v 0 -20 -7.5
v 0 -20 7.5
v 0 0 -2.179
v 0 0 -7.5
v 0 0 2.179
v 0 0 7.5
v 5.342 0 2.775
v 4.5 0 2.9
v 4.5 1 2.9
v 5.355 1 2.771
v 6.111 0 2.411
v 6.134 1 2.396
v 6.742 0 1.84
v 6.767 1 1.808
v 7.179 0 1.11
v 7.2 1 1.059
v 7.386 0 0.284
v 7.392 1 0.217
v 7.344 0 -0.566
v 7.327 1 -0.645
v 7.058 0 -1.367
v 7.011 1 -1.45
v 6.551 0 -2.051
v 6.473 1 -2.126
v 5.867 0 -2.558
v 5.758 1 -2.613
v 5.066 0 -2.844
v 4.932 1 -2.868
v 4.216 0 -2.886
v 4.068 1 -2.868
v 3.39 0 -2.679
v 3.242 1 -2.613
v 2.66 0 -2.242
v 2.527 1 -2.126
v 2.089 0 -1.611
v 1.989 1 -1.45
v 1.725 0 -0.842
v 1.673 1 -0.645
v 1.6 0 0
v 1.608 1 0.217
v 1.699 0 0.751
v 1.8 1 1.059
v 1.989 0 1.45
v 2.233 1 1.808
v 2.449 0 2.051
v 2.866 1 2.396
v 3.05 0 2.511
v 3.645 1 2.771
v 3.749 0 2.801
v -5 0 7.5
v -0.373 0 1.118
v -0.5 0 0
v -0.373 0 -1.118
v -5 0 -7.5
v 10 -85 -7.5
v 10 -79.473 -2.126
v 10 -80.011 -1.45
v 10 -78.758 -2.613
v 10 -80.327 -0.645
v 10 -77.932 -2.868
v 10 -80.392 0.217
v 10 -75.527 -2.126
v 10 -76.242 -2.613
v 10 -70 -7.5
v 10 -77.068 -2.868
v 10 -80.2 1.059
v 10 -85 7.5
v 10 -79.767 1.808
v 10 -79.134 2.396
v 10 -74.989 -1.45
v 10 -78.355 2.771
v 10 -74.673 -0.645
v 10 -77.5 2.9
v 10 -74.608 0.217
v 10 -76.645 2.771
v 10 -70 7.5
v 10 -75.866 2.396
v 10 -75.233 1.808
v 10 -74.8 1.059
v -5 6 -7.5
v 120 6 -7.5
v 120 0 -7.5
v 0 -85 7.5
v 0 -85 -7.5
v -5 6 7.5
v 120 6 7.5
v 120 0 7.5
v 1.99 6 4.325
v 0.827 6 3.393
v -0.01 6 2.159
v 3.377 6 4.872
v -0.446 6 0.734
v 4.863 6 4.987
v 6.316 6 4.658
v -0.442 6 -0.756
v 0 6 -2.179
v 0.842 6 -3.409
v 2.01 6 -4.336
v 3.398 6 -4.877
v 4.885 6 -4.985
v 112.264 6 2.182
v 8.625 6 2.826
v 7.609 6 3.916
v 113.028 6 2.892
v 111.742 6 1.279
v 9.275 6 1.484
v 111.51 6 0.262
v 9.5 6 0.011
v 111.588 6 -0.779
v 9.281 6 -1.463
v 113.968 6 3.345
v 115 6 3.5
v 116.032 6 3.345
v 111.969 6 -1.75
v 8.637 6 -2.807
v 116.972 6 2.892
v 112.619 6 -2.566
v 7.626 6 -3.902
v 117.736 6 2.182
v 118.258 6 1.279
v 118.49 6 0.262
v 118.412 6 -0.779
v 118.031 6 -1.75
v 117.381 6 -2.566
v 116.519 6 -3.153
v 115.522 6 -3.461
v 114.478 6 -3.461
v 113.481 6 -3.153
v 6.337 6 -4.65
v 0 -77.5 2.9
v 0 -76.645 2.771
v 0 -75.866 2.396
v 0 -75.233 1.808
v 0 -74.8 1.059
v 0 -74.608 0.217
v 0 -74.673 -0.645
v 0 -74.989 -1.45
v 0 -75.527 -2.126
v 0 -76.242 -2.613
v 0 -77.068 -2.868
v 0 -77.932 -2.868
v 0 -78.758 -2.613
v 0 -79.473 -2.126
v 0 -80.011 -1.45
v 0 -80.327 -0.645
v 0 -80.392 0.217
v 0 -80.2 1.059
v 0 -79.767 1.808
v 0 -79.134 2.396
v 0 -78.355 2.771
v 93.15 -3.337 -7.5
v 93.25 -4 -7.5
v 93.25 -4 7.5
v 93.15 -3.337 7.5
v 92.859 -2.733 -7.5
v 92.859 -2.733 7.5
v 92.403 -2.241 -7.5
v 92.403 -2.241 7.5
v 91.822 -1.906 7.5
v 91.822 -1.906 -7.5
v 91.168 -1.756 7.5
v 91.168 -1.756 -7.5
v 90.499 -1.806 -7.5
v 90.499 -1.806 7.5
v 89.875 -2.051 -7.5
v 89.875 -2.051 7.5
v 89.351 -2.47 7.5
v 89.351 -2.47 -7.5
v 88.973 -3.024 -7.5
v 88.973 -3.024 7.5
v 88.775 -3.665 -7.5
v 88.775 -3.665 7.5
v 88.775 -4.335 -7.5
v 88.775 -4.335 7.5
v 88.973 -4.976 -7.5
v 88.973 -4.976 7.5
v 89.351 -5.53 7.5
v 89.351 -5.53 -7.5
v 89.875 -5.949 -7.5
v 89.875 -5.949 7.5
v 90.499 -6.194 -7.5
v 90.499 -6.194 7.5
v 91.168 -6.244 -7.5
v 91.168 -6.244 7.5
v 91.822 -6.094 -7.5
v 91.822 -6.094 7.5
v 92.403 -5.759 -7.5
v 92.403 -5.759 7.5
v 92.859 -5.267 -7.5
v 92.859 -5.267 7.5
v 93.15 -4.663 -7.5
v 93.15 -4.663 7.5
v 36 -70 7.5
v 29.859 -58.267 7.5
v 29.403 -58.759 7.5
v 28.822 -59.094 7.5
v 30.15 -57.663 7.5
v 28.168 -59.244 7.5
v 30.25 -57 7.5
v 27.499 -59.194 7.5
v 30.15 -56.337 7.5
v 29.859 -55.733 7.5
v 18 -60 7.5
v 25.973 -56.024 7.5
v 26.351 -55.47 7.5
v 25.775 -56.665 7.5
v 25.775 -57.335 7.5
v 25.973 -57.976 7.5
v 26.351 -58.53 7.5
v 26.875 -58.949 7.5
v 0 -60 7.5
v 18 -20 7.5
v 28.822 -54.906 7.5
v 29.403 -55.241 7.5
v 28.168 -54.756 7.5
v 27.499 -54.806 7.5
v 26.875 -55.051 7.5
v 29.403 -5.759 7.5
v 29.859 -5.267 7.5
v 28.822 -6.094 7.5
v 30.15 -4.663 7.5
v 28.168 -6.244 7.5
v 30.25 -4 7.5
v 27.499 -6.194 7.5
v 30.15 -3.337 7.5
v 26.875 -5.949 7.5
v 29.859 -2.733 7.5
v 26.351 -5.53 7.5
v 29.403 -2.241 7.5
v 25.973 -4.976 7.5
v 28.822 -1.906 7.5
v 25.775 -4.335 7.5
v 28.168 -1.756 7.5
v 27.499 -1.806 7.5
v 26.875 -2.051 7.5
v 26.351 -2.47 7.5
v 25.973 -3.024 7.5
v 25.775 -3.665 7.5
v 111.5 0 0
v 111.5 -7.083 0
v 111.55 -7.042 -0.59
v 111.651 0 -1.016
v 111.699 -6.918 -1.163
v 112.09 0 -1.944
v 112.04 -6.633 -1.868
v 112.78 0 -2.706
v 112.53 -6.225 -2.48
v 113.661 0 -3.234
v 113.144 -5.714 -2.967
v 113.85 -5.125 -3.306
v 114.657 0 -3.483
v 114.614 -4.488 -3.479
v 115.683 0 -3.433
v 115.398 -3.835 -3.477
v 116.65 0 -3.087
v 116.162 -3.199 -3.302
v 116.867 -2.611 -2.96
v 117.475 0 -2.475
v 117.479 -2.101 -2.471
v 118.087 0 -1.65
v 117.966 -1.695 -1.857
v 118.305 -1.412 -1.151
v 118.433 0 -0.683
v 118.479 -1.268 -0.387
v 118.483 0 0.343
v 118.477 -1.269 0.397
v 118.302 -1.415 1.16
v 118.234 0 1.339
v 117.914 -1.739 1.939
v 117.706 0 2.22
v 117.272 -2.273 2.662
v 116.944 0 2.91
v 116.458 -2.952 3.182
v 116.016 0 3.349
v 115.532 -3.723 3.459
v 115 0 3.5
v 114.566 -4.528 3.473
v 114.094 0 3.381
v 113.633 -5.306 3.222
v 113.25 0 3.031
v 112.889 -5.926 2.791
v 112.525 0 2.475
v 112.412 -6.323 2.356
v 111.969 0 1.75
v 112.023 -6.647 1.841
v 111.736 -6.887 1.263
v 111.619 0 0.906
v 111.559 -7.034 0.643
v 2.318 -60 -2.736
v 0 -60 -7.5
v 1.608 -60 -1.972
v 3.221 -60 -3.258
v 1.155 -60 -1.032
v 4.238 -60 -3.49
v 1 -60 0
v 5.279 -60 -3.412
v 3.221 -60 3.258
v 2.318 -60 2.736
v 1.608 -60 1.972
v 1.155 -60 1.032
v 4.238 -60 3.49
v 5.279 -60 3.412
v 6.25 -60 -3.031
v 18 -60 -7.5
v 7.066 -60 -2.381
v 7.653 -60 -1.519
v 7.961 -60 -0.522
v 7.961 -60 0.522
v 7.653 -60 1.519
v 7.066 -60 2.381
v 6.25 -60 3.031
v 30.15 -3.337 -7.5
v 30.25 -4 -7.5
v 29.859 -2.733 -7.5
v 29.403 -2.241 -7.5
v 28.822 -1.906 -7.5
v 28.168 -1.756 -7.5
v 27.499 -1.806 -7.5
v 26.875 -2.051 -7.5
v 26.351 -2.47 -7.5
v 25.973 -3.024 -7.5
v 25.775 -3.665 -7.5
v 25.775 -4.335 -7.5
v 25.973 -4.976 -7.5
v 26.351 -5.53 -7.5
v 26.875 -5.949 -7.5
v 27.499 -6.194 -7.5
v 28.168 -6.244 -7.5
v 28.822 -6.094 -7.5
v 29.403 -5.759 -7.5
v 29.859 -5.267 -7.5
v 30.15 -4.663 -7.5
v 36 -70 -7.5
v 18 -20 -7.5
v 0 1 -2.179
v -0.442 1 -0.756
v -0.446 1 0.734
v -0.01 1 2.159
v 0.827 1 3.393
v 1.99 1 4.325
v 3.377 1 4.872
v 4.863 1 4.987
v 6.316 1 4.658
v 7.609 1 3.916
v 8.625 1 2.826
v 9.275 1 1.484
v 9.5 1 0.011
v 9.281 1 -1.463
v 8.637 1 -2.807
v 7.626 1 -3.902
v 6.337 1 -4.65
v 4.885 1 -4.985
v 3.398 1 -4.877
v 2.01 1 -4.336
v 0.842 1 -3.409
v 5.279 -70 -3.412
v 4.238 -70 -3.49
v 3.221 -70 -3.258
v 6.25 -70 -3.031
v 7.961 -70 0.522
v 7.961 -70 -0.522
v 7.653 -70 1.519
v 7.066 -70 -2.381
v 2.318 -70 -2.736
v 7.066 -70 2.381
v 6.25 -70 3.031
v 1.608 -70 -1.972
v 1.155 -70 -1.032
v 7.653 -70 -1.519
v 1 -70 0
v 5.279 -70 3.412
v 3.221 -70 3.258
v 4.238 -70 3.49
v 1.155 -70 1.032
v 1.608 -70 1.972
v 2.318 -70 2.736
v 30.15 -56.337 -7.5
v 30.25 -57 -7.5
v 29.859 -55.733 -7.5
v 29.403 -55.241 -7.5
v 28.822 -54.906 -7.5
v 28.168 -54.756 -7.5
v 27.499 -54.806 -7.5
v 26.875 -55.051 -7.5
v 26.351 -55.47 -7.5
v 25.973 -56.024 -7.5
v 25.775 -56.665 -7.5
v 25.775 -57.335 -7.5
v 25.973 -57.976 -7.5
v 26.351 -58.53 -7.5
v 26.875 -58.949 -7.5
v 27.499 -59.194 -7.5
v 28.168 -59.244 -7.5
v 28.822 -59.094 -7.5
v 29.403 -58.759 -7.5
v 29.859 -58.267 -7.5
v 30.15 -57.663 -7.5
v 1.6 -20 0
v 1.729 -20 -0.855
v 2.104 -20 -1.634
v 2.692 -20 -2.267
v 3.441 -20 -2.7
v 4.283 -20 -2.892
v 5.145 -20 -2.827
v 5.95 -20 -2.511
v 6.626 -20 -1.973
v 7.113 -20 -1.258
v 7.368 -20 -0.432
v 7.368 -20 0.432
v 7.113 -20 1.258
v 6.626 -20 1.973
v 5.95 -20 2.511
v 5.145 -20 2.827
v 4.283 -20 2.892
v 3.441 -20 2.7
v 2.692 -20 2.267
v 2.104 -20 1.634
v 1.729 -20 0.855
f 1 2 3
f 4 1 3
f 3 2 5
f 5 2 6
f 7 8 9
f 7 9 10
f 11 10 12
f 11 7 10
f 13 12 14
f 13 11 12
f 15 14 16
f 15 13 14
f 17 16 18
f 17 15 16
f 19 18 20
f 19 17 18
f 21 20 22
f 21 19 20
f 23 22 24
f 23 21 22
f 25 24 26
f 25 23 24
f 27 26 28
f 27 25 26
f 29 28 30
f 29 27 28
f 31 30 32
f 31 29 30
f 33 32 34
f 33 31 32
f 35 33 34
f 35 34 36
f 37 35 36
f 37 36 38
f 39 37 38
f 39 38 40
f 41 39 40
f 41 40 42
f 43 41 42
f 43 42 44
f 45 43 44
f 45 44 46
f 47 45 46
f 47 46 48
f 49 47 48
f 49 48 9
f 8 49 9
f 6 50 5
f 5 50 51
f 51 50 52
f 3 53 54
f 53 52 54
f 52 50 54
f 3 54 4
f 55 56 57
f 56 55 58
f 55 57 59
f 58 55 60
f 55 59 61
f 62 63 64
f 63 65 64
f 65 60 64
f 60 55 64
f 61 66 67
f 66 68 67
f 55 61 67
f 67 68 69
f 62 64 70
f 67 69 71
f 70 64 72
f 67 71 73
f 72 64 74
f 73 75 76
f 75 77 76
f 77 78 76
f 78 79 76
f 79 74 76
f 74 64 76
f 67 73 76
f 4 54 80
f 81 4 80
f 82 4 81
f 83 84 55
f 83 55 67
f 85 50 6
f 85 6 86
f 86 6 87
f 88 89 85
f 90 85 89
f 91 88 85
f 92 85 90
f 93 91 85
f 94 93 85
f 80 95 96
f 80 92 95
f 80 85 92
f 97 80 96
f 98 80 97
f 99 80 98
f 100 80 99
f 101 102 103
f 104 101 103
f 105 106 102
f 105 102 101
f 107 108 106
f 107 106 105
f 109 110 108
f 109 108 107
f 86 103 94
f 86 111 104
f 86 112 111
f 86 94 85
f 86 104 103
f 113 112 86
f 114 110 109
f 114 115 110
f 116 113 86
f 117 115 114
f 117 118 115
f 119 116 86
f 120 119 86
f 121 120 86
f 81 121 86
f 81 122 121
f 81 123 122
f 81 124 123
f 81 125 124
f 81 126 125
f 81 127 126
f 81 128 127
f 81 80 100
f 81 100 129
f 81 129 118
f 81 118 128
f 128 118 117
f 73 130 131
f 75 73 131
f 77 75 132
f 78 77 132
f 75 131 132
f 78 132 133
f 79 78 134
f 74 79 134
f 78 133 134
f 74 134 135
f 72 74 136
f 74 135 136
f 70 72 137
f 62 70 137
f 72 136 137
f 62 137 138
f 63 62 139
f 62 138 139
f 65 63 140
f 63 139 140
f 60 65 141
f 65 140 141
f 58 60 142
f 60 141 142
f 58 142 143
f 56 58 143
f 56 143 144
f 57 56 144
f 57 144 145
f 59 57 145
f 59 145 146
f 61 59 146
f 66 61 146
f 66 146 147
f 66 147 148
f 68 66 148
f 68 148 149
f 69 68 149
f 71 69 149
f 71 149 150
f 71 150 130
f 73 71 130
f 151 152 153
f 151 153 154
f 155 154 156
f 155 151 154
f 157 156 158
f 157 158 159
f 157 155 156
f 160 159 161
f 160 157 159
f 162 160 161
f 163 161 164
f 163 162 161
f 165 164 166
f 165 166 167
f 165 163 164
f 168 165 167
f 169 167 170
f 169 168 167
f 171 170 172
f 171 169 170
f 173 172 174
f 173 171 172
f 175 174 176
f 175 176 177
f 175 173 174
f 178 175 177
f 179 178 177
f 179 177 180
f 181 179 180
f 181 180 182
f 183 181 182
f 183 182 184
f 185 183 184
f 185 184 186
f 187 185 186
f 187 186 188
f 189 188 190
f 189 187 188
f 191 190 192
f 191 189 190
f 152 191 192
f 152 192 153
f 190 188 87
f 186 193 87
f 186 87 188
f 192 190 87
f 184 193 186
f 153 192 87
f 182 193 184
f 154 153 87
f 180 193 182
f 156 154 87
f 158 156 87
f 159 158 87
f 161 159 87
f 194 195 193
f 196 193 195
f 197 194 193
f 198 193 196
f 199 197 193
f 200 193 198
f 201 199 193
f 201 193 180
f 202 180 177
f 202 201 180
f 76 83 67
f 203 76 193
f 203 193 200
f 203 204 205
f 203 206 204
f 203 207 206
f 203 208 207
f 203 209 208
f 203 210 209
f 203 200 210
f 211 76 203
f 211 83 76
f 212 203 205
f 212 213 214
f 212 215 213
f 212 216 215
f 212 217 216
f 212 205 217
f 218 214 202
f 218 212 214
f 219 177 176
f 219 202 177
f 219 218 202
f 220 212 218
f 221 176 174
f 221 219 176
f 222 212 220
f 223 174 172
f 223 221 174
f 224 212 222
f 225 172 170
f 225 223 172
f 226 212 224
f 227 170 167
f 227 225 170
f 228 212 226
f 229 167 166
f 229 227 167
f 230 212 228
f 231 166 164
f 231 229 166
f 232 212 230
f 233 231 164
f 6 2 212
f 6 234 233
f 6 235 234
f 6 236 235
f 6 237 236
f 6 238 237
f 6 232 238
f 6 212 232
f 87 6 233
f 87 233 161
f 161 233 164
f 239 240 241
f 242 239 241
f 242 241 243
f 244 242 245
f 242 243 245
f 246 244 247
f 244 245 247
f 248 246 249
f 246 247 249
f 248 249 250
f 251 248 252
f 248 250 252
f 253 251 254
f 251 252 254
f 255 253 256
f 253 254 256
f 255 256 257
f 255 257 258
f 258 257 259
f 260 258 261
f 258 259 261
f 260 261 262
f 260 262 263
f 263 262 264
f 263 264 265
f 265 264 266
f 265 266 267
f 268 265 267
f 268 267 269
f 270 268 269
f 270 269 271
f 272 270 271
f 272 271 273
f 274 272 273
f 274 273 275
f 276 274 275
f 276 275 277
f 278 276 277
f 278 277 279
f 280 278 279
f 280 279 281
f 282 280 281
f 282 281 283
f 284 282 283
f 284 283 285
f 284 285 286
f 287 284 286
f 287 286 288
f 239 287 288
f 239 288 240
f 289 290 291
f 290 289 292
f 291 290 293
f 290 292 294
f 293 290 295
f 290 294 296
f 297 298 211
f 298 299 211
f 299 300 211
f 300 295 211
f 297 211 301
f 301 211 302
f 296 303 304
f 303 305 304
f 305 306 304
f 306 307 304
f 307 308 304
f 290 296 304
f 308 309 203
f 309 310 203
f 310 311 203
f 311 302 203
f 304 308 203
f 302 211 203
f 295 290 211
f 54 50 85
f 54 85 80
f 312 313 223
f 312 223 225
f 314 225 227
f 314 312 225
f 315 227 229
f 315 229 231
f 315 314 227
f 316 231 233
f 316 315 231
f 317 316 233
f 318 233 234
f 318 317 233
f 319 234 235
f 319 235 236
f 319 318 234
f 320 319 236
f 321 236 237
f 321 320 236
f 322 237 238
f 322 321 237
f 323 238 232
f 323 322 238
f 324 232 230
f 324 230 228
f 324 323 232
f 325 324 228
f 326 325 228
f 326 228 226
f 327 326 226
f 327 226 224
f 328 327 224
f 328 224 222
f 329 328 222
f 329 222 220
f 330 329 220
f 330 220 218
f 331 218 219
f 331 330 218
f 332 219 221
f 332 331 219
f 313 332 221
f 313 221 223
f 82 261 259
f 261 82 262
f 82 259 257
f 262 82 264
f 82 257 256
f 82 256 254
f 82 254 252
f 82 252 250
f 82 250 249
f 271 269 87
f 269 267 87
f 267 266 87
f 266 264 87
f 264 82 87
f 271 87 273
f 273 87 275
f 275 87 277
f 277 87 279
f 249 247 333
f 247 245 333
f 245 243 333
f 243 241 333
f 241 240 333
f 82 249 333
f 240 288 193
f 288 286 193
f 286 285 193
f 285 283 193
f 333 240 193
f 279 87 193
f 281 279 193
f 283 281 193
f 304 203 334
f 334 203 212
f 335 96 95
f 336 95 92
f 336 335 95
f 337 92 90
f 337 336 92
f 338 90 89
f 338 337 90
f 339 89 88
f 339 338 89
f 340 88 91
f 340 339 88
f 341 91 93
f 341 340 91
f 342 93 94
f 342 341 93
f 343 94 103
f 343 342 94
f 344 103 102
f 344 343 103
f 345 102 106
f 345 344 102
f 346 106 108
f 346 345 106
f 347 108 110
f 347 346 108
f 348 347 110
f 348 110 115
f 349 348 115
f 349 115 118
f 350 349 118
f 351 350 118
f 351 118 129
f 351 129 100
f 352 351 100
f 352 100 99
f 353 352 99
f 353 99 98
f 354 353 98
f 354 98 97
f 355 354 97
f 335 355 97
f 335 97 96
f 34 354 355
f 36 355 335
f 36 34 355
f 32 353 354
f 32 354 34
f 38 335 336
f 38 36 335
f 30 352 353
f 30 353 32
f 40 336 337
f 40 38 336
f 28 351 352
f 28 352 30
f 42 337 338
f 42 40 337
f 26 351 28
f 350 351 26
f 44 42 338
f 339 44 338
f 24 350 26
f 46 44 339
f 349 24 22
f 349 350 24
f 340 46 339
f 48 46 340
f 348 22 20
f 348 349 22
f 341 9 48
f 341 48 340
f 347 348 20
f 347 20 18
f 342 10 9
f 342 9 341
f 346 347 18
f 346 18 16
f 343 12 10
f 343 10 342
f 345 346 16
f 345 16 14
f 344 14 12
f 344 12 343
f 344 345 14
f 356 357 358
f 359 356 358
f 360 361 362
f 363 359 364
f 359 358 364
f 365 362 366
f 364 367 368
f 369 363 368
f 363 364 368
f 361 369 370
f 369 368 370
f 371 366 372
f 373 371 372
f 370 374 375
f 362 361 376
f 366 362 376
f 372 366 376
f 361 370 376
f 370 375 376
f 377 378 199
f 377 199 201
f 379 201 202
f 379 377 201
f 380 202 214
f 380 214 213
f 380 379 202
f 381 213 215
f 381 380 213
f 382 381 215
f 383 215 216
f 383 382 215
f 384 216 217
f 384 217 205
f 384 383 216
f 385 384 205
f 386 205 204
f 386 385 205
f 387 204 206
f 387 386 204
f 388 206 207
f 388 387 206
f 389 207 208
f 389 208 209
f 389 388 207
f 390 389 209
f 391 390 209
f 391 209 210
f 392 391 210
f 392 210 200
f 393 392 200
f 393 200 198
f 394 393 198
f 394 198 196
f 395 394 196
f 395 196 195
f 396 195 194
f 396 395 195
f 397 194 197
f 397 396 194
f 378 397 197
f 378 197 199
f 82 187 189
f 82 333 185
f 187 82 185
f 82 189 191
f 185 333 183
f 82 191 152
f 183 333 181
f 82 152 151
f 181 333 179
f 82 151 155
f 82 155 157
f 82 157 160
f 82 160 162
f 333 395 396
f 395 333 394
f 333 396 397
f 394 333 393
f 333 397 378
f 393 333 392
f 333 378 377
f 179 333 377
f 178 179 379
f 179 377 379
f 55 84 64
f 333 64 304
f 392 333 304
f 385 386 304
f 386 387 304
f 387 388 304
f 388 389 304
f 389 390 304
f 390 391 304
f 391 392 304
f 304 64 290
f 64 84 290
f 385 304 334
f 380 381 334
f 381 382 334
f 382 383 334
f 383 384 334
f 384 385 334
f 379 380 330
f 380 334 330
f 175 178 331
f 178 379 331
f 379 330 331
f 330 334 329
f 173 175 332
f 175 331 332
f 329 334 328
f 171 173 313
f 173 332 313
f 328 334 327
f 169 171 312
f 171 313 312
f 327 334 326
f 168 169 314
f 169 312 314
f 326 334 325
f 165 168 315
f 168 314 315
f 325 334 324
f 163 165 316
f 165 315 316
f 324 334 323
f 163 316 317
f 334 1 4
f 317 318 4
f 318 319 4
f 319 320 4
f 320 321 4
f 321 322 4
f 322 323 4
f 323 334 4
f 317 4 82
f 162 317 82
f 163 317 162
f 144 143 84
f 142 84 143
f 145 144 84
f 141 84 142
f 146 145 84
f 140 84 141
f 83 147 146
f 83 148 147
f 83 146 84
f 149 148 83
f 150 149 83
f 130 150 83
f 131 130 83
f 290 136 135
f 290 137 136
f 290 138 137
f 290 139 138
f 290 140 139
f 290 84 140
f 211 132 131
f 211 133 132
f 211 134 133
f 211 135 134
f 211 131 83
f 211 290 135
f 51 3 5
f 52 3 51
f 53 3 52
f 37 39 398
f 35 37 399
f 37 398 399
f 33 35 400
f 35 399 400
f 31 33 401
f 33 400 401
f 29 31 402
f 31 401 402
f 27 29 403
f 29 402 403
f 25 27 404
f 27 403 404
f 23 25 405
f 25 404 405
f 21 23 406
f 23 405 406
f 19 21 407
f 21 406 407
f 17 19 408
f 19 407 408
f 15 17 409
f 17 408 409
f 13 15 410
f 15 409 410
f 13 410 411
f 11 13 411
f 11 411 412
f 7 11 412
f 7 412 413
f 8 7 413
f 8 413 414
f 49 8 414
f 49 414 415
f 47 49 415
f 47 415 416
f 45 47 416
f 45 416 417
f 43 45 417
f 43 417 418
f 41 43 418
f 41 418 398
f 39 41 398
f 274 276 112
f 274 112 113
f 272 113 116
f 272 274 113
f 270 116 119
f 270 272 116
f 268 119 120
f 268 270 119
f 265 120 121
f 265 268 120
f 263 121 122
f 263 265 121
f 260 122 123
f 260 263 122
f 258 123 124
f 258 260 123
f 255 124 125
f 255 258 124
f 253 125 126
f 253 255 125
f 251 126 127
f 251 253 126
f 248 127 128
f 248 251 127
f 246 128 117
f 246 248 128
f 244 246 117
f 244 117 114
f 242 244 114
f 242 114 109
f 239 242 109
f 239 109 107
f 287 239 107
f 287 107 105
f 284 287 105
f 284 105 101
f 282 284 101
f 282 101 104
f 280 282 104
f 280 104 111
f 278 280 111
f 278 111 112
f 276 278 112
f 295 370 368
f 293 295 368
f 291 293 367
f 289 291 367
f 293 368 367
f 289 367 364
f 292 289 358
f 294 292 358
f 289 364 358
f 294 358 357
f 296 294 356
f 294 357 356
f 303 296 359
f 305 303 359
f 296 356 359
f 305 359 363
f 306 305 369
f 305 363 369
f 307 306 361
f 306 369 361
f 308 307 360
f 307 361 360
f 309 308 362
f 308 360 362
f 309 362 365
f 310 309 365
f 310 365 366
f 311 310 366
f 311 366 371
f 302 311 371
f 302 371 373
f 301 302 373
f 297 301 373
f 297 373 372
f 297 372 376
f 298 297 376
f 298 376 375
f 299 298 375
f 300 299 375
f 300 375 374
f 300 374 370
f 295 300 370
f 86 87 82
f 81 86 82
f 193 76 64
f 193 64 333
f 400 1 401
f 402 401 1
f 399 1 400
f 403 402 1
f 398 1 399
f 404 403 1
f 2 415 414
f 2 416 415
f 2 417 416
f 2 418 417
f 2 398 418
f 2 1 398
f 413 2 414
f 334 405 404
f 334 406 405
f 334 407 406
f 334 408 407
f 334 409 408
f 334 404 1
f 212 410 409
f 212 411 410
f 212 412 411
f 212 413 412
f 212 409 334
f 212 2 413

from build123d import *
from build123d.topology import SkipClean

# Parameters (mm, degrees)
BOSS_EXTRUDE1_DEPTH                = 7.5
CUT_EXTRUDE1_REACH                 = 158.924
SKETCH2_W                          = 18
SKETCH2_H                          = 40
M5_CLEARANCE_HOLE1_D               = 5.8
CUT_EXTRUDE2_REACH                 = 158.924
F_7_0_7_DIAMETER_HOLE1_D           = 7
F_7_0_7_DIAMETER_HOLE1_DEPTH       = 20
MOVE_FACE1_BY                      = 0.6
SKETCH15_W                         = 15
SKETCH15_H                         = 15
BOSS_EXTRUDE3_DEPTH                = 10
M5_CLEARANCE_HOLE2_D               = 5.8
SKETCH19_W                         = 125
SKETCH19_H                         = 15
SKETCH19_R                         = 3.5
SKETCH19_R_2                       = 5
BOSS_EXTRUDE4_DEPTH                = 6
SKETCH23_R                         = 5
SKETCH23_R_2                       = 2.9
BOSS_EXTRUDE5_DEPTH                = 1
F_4_5_START                        = -7.5
F_4_5_4_5_DIAMETER_HOLE1_OUTLINE_R = 2.25
F_4_5_4_5_DIAMETER_HOLE1_DEPTH     = 15


# Read off the part's stored shape, not the designer's step: Ø4.5 (4.5) Diameter Hole1
with BuildPart() as part:
    # Sketch1 → Boss-Extrude1 (new, symmetric)
    with BuildSketch(Plane.XY):
        Polygon((0, 0), (120, 0), (0, -100), align=None)
    extrude(amount=BOSS_EXTRUDE1_DEPTH, both=True)

    # Sketch2 → Cut-Extrude1 (cut, up to next)
    with BuildSketch(Plane.XY.offset(7.5), mode=Mode.PRIVATE) as cut_extrude1_sk1:
        with Locations((9, -40)):
            Rectangle(SKETCH2_W, SKETCH2_H)
    cut_extrude1_tool1 = extrude(cut_extrude1_sk1.sketch, amount=-CUT_EXTRUDE1_REACH, mode=Mode.PRIVATE) & part.part
    add(cut_extrude1_tool1.solids().sort_by_distance((9, -40, 7.5))[0], mode=Mode.SUBTRACT)

    # M5 Clearance Hole1 (through all)
    with Locations(Plane(origin=(0, 0, 0), x_dir=(1, 0, 0), z_dir=(0, 1, 0))):
        with Locations((4.5, 0)):
            Hole(M5_CLEARANCE_HOLE1_D / 2)

    # Sketch8 → Cut-Extrude2 (cut, up to next)
    with BuildSketch(Plane.XY.offset(7.5), mode=Mode.PRIVATE) as cut_extrude2_sk1:
        Polygon((0, -70), (36, -70), (0, -100), align=None)
    cut_extrude2_tool1 = extrude(cut_extrude2_sk1.sketch, amount=-CUT_EXTRUDE2_REACH, mode=Mode.PRIVATE) & part.part
    add(cut_extrude2_tool1.solids().sort_by_distance((12, -80, 7.5))[0], mode=Mode.SUBTRACT)

    # Ø7.0 (7) Diameter Hole1
    with Locations(Plane(origin=(0, 0, 0), x_dir=(1, 0, 0), z_dir=(0, 1, 0))):
        with Locations((115, 0)):
            Hole(F_7_0_7_DIAMETER_HOLE1_D / 2, depth=F_7_0_7_DIAMETER_HOLE1_DEPTH)

    # Move Face1: a curved face moved inward by 0.6
    add(Solid.thicken(part.faces().sort_by_distance((7.4, -65, 0))[0], -MOVE_FACE1_BY), mode=Mode.SUBTRACT)

    # Sketch15 → Boss-Extrude3 (add)
    with BuildSketch(Plane.ZY):
        with Locations((0, -77.5)):
            Rectangle(SKETCH15_W, SKETCH15_H)
    extrude(amount=-BOSS_EXTRUDE3_DEPTH)

    # M5 Clearance Hole2 (through all)
    with Locations(Plane(origin=(10, 0, 0), x_dir=(0, 0, -1), z_dir=(1, 0, 0))):
        with Locations((0, -77.5)):
            Hole(M5_CLEARANCE_HOLE2_D / 2)

    # Sketch19 → Boss-Extrude4 (add)
    with SkipClean():  # the faces are left unmerged after this step: merging them gives an invalid solid
        with BuildSketch(Plane(origin=(0, 0, 0), x_dir=(1, 0, 0), z_dir=(0, 1, 0))):
            with Locations((57.5, 0)):
                Rectangle(SKETCH19_W, SKETCH19_H)
            with Locations(Location((115, 0, 0), (0, 0, 270))):
                Circle(SKETCH19_R, mode=Mode.SUBTRACT)
            with Locations(Location((4.5, 0, 0), (0, 0, 154.158067237))):
                Circle(SKETCH19_R_2, mode=Mode.SUBTRACT)
        extrude(amount=BOSS_EXTRUDE4_DEPTH)

    # Sketch23 → Boss-Extrude5 (add)
    with BuildSketch(Plane(origin=(0, 0, 0), x_dir=(1, 0, 0), z_dir=(0, 1, 0))):
        with Locations(Location((4.5, 0, 0), (0, 0, 270))):
            Circle(SKETCH23_R)
        with Locations(Location((4.5, 0, 0), (0, 0, 270))):
            Circle(SKETCH23_R_2, mode=Mode.SUBTRACT)
    extrude(amount=BOSS_EXTRUDE5_DEPTH)

    # Ø4.5 (4.5) Diameter Hole1 outline → Ø4.5 (4.5) Diameter Hole1 (cut)
    with BuildSketch(Plane.XY.offset(F_4_5_START)):
        with Locations((91, -4)):
            Circle(F_4_5_4_5_DIAMETER_HOLE1_OUTLINE_R)
        with Locations((28, -57)):
            Circle(F_4_5_4_5_DIAMETER_HOLE1_OUTLINE_R)
        with Locations((28, -4)):
            Circle(F_4_5_4_5_DIAMETER_HOLE1_OUTLINE_R)
    extrude(amount=F_4_5_4_5_DIAMETER_HOLE1_DEPTH, mode=Mode.SUBTRACT)


solid = part.part
